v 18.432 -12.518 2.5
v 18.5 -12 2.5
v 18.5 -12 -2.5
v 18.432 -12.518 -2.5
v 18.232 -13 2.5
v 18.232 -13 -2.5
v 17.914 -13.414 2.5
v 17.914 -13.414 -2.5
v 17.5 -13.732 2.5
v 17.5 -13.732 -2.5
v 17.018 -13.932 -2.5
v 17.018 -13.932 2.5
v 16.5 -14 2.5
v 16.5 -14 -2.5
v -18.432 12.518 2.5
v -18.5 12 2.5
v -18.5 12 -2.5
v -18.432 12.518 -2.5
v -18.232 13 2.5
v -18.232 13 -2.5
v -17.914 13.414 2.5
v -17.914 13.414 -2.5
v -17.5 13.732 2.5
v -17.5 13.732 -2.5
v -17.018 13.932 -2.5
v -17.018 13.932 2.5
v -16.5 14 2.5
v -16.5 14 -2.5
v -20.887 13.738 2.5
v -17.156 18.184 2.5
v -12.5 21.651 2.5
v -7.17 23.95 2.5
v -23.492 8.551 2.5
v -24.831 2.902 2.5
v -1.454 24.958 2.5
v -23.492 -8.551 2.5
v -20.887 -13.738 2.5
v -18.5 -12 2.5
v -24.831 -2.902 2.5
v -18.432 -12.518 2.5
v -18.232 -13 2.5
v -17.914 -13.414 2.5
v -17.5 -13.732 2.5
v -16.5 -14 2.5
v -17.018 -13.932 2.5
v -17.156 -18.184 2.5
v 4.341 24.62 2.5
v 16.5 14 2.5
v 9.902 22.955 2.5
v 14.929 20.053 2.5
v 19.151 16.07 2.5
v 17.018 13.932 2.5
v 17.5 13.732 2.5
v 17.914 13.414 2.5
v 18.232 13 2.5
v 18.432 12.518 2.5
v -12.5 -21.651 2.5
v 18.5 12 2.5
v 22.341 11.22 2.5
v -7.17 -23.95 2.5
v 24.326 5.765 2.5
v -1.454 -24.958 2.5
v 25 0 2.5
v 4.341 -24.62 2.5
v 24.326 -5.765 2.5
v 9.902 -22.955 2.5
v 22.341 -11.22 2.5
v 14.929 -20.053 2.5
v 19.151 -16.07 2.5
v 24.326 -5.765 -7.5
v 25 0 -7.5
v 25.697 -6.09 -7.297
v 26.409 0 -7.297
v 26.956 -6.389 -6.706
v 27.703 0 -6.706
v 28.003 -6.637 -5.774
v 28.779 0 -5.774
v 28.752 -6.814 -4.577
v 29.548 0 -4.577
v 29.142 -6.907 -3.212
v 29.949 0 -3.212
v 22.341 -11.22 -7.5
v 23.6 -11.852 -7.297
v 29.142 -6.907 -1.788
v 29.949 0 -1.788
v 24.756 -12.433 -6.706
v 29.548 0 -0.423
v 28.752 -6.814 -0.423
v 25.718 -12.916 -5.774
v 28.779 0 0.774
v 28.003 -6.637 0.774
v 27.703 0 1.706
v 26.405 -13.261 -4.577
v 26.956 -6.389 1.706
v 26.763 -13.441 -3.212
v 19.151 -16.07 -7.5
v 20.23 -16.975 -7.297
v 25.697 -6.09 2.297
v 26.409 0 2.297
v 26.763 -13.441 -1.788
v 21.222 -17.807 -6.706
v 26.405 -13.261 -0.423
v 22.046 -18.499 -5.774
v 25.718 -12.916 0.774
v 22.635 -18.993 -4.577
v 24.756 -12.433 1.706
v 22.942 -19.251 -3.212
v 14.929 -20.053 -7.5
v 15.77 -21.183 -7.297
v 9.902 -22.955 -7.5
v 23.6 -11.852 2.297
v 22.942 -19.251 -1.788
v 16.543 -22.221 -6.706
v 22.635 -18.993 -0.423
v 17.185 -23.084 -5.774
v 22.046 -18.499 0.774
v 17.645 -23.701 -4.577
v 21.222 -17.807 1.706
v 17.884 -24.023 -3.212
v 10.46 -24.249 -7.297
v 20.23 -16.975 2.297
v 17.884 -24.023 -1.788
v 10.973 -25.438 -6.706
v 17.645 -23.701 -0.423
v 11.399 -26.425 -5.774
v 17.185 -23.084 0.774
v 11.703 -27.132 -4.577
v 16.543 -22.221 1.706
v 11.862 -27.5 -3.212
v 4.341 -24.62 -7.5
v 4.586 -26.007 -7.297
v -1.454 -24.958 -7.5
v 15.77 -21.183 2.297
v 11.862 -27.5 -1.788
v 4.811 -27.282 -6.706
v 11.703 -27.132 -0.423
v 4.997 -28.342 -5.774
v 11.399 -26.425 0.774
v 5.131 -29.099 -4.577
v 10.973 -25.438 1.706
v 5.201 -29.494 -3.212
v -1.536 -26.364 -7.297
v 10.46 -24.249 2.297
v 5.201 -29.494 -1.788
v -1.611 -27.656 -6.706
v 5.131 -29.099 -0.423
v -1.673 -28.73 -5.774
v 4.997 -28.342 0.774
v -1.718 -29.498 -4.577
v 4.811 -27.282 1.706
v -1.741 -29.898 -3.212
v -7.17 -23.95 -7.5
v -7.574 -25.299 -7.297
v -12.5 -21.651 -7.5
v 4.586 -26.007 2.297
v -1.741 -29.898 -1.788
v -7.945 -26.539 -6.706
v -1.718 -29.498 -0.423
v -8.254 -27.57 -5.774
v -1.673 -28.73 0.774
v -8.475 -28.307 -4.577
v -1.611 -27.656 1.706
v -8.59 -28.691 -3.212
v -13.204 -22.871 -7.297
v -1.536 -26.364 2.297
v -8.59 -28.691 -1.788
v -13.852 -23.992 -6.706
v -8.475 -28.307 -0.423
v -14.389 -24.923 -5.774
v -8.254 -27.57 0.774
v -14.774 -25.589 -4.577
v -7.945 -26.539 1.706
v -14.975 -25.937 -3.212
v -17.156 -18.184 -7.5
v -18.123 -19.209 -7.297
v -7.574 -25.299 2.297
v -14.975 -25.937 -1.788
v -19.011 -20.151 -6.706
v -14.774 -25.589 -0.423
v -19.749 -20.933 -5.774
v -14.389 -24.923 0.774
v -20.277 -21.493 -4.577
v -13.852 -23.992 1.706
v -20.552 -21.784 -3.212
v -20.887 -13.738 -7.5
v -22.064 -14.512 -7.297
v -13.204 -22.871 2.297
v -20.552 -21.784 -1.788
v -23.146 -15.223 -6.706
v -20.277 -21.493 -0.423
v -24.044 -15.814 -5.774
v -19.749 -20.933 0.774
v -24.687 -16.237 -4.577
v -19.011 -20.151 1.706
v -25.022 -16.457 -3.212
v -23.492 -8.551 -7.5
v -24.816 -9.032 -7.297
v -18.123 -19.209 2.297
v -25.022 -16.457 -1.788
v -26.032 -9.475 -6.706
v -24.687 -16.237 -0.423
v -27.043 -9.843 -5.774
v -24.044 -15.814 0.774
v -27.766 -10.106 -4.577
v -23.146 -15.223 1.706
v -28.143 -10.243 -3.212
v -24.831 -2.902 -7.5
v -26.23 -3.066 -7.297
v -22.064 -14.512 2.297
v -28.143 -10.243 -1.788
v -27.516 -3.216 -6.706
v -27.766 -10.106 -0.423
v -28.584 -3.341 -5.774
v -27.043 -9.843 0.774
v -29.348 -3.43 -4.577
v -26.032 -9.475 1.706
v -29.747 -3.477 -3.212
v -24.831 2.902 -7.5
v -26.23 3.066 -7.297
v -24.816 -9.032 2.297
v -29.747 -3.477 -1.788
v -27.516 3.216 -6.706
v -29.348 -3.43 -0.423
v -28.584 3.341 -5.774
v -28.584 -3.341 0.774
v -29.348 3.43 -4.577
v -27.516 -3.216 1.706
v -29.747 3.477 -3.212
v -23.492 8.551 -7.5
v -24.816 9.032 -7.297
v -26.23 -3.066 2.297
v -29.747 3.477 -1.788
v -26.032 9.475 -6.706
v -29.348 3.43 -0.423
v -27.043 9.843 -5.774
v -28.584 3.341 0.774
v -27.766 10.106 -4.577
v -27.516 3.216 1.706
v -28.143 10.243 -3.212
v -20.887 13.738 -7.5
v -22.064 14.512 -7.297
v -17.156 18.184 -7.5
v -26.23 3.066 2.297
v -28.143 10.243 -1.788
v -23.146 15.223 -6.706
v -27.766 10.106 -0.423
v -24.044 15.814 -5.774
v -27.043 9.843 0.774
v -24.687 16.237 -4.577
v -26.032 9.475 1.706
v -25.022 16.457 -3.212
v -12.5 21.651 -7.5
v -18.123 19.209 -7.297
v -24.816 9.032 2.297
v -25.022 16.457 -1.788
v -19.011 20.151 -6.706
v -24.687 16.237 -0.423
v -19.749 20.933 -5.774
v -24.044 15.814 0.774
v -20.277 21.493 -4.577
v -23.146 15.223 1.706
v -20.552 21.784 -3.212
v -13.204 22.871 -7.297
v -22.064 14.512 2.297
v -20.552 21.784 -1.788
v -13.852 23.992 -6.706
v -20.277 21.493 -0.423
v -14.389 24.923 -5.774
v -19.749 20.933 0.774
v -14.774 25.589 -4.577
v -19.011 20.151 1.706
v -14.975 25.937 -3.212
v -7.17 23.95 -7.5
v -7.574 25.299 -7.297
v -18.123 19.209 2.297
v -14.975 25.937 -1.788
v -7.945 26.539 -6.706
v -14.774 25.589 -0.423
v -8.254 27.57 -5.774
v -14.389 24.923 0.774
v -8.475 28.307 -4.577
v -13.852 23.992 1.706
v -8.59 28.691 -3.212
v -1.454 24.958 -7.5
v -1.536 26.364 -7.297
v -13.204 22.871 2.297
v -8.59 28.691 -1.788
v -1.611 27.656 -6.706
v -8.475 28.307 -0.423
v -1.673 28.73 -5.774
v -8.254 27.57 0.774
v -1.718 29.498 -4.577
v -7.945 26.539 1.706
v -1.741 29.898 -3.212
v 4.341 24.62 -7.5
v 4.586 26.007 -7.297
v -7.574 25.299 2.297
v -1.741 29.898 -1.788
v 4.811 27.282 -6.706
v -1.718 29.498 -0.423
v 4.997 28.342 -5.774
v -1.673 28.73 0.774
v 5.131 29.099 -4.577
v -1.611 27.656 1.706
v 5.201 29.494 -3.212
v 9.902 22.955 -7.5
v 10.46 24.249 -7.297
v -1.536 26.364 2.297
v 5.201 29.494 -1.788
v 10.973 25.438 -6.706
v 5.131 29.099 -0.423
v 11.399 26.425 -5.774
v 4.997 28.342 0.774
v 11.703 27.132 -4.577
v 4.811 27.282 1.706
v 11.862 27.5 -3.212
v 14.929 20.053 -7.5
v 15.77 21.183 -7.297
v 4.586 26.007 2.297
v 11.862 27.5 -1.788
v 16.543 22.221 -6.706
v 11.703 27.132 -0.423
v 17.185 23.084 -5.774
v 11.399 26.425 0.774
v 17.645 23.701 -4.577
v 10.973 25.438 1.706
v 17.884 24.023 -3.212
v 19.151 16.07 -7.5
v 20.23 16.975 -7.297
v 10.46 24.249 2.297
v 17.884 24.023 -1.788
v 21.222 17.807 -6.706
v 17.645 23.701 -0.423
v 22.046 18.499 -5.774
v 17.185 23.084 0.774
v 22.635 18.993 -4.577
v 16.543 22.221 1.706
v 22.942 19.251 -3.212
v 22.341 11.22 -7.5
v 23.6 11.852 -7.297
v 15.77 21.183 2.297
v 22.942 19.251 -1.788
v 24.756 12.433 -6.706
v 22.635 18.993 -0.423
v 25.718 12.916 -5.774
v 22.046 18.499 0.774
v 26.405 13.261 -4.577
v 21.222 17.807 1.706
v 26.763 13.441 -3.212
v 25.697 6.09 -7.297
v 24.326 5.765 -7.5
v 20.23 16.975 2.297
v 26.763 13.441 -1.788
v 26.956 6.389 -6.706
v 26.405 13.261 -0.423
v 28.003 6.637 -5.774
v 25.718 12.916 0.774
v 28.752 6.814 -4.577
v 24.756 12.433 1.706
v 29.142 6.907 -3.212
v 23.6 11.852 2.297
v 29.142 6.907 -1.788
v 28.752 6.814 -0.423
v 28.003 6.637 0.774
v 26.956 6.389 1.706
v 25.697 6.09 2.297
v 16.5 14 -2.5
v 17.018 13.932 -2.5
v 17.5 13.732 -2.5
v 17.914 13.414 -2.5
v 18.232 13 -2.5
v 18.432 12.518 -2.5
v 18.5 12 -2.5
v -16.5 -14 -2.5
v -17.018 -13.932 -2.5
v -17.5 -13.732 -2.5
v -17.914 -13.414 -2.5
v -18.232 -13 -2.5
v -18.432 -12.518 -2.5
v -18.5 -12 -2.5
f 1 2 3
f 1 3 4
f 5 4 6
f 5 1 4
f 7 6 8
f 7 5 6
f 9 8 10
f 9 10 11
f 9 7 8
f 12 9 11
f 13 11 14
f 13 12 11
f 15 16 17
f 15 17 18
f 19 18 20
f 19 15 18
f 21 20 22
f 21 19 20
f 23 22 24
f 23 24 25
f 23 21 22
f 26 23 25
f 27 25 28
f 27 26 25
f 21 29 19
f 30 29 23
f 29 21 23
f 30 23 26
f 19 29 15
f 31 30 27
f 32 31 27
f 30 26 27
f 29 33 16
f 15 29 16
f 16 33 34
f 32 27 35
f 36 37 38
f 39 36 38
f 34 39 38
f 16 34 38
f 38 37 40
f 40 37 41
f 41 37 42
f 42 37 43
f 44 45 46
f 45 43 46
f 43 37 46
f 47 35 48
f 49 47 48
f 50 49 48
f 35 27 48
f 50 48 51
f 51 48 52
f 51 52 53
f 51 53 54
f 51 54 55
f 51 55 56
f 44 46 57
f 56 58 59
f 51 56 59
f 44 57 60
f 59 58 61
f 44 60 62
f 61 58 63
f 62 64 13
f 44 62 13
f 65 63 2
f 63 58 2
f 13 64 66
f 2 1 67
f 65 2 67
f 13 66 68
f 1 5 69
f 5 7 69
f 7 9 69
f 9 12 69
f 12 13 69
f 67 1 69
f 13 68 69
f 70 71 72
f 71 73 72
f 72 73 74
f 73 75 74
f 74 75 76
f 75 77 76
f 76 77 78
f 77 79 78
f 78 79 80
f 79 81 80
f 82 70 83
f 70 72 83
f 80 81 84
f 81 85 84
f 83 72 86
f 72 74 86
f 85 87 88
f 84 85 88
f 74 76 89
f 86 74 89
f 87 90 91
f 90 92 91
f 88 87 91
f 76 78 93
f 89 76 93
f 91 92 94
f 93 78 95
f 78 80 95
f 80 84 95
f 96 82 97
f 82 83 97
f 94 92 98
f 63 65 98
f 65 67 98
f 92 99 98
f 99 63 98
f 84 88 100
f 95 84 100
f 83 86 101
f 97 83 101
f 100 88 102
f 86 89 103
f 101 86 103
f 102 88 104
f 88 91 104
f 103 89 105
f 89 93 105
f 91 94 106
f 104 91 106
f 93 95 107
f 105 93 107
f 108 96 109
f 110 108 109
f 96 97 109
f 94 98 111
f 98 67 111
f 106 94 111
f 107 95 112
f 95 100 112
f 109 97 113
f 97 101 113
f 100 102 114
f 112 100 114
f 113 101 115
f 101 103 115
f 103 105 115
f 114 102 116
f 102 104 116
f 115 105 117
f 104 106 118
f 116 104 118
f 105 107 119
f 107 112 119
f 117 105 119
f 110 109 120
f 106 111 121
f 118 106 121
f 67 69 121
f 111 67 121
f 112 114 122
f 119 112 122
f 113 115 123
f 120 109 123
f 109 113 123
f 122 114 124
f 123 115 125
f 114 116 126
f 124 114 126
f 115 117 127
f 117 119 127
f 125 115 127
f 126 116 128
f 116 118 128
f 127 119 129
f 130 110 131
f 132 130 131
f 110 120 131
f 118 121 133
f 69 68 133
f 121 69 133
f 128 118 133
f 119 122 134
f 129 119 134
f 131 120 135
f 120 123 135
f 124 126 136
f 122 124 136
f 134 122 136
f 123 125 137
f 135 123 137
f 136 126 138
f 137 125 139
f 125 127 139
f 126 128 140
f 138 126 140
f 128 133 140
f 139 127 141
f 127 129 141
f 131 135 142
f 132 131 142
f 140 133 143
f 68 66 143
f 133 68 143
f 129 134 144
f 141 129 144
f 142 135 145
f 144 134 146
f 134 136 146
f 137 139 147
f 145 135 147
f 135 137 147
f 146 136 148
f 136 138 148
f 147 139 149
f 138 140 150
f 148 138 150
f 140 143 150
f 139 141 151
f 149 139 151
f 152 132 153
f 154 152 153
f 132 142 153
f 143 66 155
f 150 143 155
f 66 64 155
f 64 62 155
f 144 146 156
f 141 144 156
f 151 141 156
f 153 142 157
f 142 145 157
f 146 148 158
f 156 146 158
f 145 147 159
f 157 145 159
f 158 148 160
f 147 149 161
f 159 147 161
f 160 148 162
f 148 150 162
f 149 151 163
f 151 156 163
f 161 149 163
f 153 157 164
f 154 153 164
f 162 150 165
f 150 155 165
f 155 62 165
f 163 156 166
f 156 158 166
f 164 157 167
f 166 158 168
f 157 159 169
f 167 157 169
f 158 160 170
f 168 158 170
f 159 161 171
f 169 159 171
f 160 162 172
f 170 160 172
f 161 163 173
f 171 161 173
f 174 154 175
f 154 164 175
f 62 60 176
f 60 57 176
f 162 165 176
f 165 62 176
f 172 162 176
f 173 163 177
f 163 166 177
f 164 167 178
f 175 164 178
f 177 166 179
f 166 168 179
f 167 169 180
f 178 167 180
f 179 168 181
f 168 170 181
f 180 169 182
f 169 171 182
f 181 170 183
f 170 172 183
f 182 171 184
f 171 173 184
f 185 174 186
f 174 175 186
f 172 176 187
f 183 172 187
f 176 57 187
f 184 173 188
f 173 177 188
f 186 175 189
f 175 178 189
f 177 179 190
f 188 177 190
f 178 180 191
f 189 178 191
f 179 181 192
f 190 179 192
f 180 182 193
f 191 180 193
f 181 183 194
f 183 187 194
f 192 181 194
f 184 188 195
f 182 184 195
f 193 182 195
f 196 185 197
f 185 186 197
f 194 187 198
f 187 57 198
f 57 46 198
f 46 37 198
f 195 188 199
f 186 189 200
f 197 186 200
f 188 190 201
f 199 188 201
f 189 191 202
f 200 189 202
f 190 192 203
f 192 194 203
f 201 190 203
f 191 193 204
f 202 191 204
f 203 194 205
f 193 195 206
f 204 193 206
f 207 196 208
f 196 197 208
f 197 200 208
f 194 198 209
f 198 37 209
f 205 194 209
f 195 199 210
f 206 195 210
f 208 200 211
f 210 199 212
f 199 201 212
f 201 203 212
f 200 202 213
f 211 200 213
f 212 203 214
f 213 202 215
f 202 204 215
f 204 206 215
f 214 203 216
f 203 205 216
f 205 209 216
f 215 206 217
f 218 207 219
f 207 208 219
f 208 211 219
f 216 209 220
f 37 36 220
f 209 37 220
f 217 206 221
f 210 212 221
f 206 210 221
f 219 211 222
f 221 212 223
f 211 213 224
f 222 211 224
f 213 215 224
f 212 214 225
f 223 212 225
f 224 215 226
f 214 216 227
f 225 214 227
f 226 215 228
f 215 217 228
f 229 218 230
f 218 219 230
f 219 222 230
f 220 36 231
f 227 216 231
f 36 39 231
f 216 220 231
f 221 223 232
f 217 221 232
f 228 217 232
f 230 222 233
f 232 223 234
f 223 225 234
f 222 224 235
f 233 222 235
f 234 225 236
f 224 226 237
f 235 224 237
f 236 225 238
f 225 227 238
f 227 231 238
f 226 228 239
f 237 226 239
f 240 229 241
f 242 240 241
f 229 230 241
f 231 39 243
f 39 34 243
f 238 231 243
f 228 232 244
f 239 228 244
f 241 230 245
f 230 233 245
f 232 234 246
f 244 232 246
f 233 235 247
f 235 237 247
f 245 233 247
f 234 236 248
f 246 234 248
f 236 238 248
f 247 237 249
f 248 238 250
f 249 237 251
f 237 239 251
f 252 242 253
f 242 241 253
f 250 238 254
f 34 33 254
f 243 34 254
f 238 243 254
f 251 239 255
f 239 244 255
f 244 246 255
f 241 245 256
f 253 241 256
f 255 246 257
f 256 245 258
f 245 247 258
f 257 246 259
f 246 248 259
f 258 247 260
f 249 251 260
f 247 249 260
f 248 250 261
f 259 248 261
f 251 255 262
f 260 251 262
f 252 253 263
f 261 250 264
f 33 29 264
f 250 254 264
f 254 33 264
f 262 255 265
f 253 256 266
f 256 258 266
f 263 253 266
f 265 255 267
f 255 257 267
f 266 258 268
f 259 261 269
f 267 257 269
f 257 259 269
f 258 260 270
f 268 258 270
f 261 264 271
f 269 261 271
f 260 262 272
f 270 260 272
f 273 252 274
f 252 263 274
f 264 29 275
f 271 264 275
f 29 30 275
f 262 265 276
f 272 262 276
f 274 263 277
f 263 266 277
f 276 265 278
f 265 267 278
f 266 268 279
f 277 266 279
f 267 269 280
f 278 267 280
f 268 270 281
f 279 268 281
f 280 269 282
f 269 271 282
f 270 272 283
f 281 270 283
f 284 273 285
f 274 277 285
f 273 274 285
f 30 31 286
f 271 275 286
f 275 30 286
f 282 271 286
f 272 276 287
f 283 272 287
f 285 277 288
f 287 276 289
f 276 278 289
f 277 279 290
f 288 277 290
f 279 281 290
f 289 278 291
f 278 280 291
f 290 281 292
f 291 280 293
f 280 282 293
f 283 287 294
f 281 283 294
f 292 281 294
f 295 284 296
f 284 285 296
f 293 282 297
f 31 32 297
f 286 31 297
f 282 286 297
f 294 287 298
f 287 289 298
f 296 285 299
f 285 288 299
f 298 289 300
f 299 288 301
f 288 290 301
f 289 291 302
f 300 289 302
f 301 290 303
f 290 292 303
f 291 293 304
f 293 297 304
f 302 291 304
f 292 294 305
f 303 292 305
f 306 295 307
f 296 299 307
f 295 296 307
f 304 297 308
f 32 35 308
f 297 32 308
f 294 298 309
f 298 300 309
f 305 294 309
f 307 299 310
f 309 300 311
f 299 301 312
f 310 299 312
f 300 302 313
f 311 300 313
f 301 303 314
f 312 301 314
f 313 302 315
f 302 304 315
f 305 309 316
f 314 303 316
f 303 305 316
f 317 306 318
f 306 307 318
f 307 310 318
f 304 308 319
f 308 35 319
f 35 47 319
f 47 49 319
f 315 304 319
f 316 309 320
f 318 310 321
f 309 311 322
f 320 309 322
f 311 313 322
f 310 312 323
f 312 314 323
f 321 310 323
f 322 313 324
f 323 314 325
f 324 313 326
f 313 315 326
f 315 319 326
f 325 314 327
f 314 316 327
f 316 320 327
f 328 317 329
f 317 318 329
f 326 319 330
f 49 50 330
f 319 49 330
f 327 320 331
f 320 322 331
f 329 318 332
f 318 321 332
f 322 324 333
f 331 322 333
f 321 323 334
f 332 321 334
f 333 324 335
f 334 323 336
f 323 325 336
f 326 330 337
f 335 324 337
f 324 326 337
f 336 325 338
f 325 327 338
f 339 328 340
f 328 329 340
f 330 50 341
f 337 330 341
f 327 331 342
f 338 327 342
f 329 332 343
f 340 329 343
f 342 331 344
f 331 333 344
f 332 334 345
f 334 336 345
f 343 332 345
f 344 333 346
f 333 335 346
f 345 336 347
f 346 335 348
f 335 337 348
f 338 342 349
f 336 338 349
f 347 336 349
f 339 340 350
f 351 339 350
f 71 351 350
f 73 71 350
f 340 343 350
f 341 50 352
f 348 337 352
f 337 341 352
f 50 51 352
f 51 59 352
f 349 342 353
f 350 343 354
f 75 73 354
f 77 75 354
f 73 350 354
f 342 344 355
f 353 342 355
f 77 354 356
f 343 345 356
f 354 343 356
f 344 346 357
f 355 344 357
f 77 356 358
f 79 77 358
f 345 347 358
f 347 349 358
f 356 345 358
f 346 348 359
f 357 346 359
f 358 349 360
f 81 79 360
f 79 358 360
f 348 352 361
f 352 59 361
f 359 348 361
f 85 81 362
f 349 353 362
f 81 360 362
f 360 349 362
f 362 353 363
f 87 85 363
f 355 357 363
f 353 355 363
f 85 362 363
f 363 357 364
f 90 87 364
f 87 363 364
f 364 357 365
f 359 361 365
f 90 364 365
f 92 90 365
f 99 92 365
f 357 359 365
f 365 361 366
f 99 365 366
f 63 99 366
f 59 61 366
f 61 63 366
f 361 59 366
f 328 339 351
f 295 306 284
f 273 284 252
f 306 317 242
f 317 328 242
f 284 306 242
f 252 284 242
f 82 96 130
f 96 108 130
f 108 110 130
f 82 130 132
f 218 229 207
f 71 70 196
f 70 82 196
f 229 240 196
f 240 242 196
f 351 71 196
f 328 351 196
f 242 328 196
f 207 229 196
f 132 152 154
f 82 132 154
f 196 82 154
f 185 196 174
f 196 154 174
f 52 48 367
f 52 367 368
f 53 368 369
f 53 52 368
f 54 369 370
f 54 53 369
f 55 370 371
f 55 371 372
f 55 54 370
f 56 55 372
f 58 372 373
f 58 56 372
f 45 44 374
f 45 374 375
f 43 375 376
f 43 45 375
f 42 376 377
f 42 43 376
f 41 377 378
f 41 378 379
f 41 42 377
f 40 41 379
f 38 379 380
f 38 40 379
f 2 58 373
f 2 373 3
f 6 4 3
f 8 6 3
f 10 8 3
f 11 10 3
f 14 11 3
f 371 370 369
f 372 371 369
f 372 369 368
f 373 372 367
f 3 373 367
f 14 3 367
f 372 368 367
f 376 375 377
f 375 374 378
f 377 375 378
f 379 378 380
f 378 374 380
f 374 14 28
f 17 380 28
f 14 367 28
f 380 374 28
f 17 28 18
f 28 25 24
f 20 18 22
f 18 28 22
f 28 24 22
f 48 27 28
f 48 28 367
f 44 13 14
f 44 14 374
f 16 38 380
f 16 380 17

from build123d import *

# Parameters (mm, degrees)
CUT_EXTRUDE3_DEPTH = 5


with BuildPart() as part:
    # Sketch7 → Revolve2 (revolve)
    with BuildSketch(Plane(origin=(0, 0, 0), x_dir=(1, 0, 0), z_dir=(0, 1, 0))):
        with BuildLine():
            Line((0, -2.5), (0, 7.5))
            Line((0, 7.5), (25, 7.5))
            ThreePointArc((25, 7.5), (30, 2.5), (25, -2.5))
            Line((25, -2.5), (0, -2.5))
        make_face()
    revolve(axis=Axis((0, 0, 2.5), (0, 0, -1)))

    # Sketch9 → Cut-Extrude3 (cut)
    with BuildSketch(Plane.XY.offset(2.5)):
        with BuildLine():
            Line((16.5, -14), (-16.5, -14))
            ThreePointArc((-16.5, -14), (-17.914213562, -13.414213562), (-18.5, -12))
            Line((-18.5, -12), (-18.5, 12))
            ThreePointArc((-18.5, 12), (-17.914213562, 13.414213562), (-16.5, 14))
            Line((-16.5, 14), (16.5, 14))
            ThreePointArc((16.5, 14), (17.914213562, 13.414213562), (18.5, 12))
            Line((18.5, 12), (18.5, -12))
            ThreePointArc((18.5, -12), (17.914213562, -13.414213562), (16.5, -14))
        make_face()
    extrude(amount=-CUT_EXTRUDE3_DEPTH, mode=Mode.SUBTRACT)


solid = part.part
